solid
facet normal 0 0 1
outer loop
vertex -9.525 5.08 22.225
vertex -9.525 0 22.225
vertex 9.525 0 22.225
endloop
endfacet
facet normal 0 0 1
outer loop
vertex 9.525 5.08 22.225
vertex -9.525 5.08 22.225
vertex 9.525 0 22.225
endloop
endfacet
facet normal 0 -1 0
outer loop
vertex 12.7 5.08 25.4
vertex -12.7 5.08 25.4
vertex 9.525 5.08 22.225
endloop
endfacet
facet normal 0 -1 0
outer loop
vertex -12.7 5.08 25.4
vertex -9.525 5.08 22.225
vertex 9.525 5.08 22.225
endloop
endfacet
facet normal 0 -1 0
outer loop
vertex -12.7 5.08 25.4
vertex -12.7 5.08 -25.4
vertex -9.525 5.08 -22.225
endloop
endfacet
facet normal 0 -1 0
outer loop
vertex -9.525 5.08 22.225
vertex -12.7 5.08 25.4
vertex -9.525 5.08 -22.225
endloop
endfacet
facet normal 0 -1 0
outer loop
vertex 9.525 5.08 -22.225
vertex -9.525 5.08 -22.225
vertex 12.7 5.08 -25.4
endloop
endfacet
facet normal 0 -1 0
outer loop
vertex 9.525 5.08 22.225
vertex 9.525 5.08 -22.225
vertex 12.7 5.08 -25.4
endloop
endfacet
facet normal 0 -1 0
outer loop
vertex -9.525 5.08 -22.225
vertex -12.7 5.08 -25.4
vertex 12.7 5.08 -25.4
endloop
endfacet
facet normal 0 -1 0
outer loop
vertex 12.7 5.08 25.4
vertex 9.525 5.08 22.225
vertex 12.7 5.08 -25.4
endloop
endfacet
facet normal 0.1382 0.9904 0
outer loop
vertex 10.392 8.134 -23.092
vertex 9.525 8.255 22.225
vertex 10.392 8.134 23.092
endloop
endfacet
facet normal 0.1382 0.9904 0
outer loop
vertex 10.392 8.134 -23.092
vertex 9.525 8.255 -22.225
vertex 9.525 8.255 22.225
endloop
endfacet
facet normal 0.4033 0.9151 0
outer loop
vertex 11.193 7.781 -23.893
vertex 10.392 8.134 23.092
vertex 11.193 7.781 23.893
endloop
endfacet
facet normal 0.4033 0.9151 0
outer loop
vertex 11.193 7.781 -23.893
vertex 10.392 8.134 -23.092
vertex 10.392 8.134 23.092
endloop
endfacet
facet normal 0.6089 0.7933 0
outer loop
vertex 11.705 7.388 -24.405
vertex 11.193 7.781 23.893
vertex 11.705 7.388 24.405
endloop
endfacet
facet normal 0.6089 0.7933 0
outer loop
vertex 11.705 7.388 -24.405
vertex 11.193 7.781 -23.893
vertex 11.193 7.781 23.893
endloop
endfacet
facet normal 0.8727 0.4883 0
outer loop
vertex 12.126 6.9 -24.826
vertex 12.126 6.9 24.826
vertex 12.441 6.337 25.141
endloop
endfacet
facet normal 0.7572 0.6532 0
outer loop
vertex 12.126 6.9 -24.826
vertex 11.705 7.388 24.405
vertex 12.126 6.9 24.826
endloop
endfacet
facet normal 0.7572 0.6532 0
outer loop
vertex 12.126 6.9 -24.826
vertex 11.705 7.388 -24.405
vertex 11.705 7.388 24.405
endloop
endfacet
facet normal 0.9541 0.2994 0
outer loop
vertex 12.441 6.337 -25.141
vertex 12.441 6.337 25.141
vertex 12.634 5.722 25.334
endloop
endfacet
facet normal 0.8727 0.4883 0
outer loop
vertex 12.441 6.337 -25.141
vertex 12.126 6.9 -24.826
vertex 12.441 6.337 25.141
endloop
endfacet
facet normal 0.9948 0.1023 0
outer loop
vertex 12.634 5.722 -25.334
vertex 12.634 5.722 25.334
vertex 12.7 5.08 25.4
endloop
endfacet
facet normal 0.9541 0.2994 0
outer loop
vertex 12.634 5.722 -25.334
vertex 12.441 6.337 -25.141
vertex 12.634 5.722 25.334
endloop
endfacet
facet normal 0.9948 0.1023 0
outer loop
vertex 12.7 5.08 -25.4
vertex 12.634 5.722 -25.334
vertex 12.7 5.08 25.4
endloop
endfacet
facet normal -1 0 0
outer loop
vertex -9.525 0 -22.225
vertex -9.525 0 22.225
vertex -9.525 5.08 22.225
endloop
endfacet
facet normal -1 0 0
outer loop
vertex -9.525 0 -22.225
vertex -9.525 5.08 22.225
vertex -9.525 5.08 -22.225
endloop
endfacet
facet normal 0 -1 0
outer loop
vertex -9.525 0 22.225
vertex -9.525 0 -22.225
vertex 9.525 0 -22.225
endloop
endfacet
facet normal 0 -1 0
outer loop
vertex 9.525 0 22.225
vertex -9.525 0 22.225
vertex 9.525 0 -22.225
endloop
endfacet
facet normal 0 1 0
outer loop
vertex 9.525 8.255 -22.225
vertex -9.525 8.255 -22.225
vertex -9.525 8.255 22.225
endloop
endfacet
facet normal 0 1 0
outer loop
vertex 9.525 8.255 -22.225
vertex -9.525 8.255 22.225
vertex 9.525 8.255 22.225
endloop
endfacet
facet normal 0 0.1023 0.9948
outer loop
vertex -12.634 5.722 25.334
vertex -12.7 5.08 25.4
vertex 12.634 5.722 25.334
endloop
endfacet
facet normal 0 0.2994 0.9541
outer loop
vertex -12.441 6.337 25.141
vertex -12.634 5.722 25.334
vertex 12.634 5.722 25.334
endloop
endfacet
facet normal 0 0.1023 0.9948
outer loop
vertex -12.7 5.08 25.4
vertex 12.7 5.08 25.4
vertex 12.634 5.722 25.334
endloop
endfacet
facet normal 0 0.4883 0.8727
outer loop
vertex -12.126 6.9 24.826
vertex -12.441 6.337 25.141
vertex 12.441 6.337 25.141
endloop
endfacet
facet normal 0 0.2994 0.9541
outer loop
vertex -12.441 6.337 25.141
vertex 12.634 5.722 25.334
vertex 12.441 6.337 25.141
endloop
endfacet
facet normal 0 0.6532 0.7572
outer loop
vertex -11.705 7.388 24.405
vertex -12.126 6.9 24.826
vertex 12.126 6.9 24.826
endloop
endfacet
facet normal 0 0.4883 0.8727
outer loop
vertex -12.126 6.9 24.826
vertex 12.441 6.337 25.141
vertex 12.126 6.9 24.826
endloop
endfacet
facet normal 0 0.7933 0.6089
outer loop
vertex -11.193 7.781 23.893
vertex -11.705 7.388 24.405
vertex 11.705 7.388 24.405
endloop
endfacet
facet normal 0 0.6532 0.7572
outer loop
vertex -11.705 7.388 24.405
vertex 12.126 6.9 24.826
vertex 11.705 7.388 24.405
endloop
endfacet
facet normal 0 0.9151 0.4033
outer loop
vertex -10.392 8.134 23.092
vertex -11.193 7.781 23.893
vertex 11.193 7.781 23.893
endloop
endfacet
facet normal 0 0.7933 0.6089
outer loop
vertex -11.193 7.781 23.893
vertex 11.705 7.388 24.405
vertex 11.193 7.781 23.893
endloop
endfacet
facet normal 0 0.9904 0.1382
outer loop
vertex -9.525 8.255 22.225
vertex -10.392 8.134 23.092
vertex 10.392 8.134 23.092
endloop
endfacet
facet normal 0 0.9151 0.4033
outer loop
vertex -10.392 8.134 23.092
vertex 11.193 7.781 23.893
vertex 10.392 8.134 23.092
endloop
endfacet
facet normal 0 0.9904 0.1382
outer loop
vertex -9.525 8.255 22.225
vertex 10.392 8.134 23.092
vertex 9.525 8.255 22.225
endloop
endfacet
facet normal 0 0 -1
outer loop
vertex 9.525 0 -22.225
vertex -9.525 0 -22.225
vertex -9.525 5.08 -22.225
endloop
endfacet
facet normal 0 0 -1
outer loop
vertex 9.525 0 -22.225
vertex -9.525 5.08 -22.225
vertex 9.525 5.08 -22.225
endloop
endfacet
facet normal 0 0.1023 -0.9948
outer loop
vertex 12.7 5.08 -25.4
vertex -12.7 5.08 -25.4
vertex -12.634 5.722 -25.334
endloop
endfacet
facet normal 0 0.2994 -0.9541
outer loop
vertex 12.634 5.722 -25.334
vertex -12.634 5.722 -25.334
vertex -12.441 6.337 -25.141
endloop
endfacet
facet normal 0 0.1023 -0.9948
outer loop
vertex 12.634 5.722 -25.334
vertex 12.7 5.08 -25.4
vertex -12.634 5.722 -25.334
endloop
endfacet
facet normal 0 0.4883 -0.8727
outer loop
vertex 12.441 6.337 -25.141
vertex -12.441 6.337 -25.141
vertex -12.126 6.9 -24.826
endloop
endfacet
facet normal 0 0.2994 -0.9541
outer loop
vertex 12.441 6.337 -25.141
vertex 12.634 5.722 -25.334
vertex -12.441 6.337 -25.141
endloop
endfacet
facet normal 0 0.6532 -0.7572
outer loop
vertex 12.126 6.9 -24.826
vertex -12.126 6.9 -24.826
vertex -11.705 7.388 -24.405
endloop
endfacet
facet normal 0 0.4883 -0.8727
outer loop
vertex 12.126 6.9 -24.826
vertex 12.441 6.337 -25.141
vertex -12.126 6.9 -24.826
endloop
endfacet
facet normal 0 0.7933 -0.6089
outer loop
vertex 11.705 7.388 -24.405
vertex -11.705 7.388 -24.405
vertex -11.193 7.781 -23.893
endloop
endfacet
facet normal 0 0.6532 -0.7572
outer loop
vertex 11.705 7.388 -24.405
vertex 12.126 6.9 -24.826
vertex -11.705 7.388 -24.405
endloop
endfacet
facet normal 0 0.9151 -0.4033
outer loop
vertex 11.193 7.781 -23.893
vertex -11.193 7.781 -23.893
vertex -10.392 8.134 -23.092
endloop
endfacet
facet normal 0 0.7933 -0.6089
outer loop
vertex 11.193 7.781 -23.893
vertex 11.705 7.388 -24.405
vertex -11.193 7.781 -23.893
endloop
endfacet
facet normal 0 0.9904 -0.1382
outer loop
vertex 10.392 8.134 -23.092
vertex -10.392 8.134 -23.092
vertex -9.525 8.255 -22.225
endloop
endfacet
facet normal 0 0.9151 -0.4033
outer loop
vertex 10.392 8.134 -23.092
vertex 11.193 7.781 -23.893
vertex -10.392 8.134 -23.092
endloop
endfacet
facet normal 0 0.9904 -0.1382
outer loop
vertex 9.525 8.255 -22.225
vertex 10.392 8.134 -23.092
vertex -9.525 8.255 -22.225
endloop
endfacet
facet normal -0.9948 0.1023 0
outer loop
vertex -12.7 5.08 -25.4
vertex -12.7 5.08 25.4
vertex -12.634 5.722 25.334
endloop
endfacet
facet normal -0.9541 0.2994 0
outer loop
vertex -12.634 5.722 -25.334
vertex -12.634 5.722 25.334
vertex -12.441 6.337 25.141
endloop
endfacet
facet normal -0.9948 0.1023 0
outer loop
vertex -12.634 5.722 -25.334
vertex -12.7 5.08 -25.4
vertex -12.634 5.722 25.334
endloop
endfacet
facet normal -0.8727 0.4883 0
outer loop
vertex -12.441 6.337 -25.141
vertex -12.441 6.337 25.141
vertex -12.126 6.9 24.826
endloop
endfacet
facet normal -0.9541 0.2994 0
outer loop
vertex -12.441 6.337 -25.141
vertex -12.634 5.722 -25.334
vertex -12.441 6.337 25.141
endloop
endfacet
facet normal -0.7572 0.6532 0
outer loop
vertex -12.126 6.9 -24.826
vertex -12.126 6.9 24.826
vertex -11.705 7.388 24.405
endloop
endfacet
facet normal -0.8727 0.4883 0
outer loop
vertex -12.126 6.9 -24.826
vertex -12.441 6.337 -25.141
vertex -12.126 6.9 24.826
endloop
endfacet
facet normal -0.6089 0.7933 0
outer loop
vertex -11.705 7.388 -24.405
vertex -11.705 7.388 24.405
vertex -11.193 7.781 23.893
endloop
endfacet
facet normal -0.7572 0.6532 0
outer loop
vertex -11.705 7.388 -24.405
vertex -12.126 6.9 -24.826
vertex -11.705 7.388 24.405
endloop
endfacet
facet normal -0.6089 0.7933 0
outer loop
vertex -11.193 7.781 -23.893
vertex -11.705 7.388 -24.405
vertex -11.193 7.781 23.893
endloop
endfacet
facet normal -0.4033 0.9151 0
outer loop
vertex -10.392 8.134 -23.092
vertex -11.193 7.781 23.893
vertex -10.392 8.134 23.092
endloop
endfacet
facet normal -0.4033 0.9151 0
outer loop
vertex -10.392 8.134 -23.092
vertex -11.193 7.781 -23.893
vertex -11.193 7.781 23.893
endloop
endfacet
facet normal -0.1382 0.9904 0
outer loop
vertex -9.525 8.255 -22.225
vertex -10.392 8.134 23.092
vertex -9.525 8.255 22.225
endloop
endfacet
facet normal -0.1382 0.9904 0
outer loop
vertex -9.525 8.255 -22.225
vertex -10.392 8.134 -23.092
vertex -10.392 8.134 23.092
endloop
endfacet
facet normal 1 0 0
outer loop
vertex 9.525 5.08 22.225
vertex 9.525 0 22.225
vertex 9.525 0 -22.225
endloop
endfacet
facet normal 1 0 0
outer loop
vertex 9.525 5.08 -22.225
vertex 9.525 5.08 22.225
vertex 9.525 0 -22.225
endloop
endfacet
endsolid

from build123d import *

# Parameters (mm, degrees)
SKETCH1_W           = 19.05
SKETCH1_H           = 44.45
BOSS_EXTRUDE1_DEPTH = 5.08
SKETCH2_W           = 25.4
SKETCH2_H           = 50.8
BOSS_EXTRUDE2_DEPTH = 3.175
FILLET1_R           = 3.175


with BuildPart() as part:
    # Sketch1 → Boss-Extrude1 (new body)
    with BuildSketch(Plane(origin=(0, 0, 0), x_dir=(1, 0, 0), z_dir=(0, 1, 0))):
        Rectangle(SKETCH1_W, SKETCH1_H)
    extrude(amount=BOSS_EXTRUDE1_DEPTH)

    # Sketch2 → Boss-Extrude2 (add)
    with BuildSketch(Plane(origin=(0, 5.08, 0), x_dir=(1, 0, 0), z_dir=(0, 1, 0))):
        Rectangle(SKETCH2_W, SKETCH2_H)
    extrude(amount=BOSS_EXTRUDE2_DEPTH)

    # Fillet1
    fillet1_edges = [part.edges().sort_by_distance(p)[0] for p in [
        (0, 8.255, -25.4),
        (-12.7, 8.255, 0),
        (0, 8.255, 25.4),
        (12.7, 8.255, 0),
    ]]
    fillet(fillet1_edges, radius=FILLET1_R - 0.0001)  # a hair under: the kernel refuses the full size


solid = part.part
